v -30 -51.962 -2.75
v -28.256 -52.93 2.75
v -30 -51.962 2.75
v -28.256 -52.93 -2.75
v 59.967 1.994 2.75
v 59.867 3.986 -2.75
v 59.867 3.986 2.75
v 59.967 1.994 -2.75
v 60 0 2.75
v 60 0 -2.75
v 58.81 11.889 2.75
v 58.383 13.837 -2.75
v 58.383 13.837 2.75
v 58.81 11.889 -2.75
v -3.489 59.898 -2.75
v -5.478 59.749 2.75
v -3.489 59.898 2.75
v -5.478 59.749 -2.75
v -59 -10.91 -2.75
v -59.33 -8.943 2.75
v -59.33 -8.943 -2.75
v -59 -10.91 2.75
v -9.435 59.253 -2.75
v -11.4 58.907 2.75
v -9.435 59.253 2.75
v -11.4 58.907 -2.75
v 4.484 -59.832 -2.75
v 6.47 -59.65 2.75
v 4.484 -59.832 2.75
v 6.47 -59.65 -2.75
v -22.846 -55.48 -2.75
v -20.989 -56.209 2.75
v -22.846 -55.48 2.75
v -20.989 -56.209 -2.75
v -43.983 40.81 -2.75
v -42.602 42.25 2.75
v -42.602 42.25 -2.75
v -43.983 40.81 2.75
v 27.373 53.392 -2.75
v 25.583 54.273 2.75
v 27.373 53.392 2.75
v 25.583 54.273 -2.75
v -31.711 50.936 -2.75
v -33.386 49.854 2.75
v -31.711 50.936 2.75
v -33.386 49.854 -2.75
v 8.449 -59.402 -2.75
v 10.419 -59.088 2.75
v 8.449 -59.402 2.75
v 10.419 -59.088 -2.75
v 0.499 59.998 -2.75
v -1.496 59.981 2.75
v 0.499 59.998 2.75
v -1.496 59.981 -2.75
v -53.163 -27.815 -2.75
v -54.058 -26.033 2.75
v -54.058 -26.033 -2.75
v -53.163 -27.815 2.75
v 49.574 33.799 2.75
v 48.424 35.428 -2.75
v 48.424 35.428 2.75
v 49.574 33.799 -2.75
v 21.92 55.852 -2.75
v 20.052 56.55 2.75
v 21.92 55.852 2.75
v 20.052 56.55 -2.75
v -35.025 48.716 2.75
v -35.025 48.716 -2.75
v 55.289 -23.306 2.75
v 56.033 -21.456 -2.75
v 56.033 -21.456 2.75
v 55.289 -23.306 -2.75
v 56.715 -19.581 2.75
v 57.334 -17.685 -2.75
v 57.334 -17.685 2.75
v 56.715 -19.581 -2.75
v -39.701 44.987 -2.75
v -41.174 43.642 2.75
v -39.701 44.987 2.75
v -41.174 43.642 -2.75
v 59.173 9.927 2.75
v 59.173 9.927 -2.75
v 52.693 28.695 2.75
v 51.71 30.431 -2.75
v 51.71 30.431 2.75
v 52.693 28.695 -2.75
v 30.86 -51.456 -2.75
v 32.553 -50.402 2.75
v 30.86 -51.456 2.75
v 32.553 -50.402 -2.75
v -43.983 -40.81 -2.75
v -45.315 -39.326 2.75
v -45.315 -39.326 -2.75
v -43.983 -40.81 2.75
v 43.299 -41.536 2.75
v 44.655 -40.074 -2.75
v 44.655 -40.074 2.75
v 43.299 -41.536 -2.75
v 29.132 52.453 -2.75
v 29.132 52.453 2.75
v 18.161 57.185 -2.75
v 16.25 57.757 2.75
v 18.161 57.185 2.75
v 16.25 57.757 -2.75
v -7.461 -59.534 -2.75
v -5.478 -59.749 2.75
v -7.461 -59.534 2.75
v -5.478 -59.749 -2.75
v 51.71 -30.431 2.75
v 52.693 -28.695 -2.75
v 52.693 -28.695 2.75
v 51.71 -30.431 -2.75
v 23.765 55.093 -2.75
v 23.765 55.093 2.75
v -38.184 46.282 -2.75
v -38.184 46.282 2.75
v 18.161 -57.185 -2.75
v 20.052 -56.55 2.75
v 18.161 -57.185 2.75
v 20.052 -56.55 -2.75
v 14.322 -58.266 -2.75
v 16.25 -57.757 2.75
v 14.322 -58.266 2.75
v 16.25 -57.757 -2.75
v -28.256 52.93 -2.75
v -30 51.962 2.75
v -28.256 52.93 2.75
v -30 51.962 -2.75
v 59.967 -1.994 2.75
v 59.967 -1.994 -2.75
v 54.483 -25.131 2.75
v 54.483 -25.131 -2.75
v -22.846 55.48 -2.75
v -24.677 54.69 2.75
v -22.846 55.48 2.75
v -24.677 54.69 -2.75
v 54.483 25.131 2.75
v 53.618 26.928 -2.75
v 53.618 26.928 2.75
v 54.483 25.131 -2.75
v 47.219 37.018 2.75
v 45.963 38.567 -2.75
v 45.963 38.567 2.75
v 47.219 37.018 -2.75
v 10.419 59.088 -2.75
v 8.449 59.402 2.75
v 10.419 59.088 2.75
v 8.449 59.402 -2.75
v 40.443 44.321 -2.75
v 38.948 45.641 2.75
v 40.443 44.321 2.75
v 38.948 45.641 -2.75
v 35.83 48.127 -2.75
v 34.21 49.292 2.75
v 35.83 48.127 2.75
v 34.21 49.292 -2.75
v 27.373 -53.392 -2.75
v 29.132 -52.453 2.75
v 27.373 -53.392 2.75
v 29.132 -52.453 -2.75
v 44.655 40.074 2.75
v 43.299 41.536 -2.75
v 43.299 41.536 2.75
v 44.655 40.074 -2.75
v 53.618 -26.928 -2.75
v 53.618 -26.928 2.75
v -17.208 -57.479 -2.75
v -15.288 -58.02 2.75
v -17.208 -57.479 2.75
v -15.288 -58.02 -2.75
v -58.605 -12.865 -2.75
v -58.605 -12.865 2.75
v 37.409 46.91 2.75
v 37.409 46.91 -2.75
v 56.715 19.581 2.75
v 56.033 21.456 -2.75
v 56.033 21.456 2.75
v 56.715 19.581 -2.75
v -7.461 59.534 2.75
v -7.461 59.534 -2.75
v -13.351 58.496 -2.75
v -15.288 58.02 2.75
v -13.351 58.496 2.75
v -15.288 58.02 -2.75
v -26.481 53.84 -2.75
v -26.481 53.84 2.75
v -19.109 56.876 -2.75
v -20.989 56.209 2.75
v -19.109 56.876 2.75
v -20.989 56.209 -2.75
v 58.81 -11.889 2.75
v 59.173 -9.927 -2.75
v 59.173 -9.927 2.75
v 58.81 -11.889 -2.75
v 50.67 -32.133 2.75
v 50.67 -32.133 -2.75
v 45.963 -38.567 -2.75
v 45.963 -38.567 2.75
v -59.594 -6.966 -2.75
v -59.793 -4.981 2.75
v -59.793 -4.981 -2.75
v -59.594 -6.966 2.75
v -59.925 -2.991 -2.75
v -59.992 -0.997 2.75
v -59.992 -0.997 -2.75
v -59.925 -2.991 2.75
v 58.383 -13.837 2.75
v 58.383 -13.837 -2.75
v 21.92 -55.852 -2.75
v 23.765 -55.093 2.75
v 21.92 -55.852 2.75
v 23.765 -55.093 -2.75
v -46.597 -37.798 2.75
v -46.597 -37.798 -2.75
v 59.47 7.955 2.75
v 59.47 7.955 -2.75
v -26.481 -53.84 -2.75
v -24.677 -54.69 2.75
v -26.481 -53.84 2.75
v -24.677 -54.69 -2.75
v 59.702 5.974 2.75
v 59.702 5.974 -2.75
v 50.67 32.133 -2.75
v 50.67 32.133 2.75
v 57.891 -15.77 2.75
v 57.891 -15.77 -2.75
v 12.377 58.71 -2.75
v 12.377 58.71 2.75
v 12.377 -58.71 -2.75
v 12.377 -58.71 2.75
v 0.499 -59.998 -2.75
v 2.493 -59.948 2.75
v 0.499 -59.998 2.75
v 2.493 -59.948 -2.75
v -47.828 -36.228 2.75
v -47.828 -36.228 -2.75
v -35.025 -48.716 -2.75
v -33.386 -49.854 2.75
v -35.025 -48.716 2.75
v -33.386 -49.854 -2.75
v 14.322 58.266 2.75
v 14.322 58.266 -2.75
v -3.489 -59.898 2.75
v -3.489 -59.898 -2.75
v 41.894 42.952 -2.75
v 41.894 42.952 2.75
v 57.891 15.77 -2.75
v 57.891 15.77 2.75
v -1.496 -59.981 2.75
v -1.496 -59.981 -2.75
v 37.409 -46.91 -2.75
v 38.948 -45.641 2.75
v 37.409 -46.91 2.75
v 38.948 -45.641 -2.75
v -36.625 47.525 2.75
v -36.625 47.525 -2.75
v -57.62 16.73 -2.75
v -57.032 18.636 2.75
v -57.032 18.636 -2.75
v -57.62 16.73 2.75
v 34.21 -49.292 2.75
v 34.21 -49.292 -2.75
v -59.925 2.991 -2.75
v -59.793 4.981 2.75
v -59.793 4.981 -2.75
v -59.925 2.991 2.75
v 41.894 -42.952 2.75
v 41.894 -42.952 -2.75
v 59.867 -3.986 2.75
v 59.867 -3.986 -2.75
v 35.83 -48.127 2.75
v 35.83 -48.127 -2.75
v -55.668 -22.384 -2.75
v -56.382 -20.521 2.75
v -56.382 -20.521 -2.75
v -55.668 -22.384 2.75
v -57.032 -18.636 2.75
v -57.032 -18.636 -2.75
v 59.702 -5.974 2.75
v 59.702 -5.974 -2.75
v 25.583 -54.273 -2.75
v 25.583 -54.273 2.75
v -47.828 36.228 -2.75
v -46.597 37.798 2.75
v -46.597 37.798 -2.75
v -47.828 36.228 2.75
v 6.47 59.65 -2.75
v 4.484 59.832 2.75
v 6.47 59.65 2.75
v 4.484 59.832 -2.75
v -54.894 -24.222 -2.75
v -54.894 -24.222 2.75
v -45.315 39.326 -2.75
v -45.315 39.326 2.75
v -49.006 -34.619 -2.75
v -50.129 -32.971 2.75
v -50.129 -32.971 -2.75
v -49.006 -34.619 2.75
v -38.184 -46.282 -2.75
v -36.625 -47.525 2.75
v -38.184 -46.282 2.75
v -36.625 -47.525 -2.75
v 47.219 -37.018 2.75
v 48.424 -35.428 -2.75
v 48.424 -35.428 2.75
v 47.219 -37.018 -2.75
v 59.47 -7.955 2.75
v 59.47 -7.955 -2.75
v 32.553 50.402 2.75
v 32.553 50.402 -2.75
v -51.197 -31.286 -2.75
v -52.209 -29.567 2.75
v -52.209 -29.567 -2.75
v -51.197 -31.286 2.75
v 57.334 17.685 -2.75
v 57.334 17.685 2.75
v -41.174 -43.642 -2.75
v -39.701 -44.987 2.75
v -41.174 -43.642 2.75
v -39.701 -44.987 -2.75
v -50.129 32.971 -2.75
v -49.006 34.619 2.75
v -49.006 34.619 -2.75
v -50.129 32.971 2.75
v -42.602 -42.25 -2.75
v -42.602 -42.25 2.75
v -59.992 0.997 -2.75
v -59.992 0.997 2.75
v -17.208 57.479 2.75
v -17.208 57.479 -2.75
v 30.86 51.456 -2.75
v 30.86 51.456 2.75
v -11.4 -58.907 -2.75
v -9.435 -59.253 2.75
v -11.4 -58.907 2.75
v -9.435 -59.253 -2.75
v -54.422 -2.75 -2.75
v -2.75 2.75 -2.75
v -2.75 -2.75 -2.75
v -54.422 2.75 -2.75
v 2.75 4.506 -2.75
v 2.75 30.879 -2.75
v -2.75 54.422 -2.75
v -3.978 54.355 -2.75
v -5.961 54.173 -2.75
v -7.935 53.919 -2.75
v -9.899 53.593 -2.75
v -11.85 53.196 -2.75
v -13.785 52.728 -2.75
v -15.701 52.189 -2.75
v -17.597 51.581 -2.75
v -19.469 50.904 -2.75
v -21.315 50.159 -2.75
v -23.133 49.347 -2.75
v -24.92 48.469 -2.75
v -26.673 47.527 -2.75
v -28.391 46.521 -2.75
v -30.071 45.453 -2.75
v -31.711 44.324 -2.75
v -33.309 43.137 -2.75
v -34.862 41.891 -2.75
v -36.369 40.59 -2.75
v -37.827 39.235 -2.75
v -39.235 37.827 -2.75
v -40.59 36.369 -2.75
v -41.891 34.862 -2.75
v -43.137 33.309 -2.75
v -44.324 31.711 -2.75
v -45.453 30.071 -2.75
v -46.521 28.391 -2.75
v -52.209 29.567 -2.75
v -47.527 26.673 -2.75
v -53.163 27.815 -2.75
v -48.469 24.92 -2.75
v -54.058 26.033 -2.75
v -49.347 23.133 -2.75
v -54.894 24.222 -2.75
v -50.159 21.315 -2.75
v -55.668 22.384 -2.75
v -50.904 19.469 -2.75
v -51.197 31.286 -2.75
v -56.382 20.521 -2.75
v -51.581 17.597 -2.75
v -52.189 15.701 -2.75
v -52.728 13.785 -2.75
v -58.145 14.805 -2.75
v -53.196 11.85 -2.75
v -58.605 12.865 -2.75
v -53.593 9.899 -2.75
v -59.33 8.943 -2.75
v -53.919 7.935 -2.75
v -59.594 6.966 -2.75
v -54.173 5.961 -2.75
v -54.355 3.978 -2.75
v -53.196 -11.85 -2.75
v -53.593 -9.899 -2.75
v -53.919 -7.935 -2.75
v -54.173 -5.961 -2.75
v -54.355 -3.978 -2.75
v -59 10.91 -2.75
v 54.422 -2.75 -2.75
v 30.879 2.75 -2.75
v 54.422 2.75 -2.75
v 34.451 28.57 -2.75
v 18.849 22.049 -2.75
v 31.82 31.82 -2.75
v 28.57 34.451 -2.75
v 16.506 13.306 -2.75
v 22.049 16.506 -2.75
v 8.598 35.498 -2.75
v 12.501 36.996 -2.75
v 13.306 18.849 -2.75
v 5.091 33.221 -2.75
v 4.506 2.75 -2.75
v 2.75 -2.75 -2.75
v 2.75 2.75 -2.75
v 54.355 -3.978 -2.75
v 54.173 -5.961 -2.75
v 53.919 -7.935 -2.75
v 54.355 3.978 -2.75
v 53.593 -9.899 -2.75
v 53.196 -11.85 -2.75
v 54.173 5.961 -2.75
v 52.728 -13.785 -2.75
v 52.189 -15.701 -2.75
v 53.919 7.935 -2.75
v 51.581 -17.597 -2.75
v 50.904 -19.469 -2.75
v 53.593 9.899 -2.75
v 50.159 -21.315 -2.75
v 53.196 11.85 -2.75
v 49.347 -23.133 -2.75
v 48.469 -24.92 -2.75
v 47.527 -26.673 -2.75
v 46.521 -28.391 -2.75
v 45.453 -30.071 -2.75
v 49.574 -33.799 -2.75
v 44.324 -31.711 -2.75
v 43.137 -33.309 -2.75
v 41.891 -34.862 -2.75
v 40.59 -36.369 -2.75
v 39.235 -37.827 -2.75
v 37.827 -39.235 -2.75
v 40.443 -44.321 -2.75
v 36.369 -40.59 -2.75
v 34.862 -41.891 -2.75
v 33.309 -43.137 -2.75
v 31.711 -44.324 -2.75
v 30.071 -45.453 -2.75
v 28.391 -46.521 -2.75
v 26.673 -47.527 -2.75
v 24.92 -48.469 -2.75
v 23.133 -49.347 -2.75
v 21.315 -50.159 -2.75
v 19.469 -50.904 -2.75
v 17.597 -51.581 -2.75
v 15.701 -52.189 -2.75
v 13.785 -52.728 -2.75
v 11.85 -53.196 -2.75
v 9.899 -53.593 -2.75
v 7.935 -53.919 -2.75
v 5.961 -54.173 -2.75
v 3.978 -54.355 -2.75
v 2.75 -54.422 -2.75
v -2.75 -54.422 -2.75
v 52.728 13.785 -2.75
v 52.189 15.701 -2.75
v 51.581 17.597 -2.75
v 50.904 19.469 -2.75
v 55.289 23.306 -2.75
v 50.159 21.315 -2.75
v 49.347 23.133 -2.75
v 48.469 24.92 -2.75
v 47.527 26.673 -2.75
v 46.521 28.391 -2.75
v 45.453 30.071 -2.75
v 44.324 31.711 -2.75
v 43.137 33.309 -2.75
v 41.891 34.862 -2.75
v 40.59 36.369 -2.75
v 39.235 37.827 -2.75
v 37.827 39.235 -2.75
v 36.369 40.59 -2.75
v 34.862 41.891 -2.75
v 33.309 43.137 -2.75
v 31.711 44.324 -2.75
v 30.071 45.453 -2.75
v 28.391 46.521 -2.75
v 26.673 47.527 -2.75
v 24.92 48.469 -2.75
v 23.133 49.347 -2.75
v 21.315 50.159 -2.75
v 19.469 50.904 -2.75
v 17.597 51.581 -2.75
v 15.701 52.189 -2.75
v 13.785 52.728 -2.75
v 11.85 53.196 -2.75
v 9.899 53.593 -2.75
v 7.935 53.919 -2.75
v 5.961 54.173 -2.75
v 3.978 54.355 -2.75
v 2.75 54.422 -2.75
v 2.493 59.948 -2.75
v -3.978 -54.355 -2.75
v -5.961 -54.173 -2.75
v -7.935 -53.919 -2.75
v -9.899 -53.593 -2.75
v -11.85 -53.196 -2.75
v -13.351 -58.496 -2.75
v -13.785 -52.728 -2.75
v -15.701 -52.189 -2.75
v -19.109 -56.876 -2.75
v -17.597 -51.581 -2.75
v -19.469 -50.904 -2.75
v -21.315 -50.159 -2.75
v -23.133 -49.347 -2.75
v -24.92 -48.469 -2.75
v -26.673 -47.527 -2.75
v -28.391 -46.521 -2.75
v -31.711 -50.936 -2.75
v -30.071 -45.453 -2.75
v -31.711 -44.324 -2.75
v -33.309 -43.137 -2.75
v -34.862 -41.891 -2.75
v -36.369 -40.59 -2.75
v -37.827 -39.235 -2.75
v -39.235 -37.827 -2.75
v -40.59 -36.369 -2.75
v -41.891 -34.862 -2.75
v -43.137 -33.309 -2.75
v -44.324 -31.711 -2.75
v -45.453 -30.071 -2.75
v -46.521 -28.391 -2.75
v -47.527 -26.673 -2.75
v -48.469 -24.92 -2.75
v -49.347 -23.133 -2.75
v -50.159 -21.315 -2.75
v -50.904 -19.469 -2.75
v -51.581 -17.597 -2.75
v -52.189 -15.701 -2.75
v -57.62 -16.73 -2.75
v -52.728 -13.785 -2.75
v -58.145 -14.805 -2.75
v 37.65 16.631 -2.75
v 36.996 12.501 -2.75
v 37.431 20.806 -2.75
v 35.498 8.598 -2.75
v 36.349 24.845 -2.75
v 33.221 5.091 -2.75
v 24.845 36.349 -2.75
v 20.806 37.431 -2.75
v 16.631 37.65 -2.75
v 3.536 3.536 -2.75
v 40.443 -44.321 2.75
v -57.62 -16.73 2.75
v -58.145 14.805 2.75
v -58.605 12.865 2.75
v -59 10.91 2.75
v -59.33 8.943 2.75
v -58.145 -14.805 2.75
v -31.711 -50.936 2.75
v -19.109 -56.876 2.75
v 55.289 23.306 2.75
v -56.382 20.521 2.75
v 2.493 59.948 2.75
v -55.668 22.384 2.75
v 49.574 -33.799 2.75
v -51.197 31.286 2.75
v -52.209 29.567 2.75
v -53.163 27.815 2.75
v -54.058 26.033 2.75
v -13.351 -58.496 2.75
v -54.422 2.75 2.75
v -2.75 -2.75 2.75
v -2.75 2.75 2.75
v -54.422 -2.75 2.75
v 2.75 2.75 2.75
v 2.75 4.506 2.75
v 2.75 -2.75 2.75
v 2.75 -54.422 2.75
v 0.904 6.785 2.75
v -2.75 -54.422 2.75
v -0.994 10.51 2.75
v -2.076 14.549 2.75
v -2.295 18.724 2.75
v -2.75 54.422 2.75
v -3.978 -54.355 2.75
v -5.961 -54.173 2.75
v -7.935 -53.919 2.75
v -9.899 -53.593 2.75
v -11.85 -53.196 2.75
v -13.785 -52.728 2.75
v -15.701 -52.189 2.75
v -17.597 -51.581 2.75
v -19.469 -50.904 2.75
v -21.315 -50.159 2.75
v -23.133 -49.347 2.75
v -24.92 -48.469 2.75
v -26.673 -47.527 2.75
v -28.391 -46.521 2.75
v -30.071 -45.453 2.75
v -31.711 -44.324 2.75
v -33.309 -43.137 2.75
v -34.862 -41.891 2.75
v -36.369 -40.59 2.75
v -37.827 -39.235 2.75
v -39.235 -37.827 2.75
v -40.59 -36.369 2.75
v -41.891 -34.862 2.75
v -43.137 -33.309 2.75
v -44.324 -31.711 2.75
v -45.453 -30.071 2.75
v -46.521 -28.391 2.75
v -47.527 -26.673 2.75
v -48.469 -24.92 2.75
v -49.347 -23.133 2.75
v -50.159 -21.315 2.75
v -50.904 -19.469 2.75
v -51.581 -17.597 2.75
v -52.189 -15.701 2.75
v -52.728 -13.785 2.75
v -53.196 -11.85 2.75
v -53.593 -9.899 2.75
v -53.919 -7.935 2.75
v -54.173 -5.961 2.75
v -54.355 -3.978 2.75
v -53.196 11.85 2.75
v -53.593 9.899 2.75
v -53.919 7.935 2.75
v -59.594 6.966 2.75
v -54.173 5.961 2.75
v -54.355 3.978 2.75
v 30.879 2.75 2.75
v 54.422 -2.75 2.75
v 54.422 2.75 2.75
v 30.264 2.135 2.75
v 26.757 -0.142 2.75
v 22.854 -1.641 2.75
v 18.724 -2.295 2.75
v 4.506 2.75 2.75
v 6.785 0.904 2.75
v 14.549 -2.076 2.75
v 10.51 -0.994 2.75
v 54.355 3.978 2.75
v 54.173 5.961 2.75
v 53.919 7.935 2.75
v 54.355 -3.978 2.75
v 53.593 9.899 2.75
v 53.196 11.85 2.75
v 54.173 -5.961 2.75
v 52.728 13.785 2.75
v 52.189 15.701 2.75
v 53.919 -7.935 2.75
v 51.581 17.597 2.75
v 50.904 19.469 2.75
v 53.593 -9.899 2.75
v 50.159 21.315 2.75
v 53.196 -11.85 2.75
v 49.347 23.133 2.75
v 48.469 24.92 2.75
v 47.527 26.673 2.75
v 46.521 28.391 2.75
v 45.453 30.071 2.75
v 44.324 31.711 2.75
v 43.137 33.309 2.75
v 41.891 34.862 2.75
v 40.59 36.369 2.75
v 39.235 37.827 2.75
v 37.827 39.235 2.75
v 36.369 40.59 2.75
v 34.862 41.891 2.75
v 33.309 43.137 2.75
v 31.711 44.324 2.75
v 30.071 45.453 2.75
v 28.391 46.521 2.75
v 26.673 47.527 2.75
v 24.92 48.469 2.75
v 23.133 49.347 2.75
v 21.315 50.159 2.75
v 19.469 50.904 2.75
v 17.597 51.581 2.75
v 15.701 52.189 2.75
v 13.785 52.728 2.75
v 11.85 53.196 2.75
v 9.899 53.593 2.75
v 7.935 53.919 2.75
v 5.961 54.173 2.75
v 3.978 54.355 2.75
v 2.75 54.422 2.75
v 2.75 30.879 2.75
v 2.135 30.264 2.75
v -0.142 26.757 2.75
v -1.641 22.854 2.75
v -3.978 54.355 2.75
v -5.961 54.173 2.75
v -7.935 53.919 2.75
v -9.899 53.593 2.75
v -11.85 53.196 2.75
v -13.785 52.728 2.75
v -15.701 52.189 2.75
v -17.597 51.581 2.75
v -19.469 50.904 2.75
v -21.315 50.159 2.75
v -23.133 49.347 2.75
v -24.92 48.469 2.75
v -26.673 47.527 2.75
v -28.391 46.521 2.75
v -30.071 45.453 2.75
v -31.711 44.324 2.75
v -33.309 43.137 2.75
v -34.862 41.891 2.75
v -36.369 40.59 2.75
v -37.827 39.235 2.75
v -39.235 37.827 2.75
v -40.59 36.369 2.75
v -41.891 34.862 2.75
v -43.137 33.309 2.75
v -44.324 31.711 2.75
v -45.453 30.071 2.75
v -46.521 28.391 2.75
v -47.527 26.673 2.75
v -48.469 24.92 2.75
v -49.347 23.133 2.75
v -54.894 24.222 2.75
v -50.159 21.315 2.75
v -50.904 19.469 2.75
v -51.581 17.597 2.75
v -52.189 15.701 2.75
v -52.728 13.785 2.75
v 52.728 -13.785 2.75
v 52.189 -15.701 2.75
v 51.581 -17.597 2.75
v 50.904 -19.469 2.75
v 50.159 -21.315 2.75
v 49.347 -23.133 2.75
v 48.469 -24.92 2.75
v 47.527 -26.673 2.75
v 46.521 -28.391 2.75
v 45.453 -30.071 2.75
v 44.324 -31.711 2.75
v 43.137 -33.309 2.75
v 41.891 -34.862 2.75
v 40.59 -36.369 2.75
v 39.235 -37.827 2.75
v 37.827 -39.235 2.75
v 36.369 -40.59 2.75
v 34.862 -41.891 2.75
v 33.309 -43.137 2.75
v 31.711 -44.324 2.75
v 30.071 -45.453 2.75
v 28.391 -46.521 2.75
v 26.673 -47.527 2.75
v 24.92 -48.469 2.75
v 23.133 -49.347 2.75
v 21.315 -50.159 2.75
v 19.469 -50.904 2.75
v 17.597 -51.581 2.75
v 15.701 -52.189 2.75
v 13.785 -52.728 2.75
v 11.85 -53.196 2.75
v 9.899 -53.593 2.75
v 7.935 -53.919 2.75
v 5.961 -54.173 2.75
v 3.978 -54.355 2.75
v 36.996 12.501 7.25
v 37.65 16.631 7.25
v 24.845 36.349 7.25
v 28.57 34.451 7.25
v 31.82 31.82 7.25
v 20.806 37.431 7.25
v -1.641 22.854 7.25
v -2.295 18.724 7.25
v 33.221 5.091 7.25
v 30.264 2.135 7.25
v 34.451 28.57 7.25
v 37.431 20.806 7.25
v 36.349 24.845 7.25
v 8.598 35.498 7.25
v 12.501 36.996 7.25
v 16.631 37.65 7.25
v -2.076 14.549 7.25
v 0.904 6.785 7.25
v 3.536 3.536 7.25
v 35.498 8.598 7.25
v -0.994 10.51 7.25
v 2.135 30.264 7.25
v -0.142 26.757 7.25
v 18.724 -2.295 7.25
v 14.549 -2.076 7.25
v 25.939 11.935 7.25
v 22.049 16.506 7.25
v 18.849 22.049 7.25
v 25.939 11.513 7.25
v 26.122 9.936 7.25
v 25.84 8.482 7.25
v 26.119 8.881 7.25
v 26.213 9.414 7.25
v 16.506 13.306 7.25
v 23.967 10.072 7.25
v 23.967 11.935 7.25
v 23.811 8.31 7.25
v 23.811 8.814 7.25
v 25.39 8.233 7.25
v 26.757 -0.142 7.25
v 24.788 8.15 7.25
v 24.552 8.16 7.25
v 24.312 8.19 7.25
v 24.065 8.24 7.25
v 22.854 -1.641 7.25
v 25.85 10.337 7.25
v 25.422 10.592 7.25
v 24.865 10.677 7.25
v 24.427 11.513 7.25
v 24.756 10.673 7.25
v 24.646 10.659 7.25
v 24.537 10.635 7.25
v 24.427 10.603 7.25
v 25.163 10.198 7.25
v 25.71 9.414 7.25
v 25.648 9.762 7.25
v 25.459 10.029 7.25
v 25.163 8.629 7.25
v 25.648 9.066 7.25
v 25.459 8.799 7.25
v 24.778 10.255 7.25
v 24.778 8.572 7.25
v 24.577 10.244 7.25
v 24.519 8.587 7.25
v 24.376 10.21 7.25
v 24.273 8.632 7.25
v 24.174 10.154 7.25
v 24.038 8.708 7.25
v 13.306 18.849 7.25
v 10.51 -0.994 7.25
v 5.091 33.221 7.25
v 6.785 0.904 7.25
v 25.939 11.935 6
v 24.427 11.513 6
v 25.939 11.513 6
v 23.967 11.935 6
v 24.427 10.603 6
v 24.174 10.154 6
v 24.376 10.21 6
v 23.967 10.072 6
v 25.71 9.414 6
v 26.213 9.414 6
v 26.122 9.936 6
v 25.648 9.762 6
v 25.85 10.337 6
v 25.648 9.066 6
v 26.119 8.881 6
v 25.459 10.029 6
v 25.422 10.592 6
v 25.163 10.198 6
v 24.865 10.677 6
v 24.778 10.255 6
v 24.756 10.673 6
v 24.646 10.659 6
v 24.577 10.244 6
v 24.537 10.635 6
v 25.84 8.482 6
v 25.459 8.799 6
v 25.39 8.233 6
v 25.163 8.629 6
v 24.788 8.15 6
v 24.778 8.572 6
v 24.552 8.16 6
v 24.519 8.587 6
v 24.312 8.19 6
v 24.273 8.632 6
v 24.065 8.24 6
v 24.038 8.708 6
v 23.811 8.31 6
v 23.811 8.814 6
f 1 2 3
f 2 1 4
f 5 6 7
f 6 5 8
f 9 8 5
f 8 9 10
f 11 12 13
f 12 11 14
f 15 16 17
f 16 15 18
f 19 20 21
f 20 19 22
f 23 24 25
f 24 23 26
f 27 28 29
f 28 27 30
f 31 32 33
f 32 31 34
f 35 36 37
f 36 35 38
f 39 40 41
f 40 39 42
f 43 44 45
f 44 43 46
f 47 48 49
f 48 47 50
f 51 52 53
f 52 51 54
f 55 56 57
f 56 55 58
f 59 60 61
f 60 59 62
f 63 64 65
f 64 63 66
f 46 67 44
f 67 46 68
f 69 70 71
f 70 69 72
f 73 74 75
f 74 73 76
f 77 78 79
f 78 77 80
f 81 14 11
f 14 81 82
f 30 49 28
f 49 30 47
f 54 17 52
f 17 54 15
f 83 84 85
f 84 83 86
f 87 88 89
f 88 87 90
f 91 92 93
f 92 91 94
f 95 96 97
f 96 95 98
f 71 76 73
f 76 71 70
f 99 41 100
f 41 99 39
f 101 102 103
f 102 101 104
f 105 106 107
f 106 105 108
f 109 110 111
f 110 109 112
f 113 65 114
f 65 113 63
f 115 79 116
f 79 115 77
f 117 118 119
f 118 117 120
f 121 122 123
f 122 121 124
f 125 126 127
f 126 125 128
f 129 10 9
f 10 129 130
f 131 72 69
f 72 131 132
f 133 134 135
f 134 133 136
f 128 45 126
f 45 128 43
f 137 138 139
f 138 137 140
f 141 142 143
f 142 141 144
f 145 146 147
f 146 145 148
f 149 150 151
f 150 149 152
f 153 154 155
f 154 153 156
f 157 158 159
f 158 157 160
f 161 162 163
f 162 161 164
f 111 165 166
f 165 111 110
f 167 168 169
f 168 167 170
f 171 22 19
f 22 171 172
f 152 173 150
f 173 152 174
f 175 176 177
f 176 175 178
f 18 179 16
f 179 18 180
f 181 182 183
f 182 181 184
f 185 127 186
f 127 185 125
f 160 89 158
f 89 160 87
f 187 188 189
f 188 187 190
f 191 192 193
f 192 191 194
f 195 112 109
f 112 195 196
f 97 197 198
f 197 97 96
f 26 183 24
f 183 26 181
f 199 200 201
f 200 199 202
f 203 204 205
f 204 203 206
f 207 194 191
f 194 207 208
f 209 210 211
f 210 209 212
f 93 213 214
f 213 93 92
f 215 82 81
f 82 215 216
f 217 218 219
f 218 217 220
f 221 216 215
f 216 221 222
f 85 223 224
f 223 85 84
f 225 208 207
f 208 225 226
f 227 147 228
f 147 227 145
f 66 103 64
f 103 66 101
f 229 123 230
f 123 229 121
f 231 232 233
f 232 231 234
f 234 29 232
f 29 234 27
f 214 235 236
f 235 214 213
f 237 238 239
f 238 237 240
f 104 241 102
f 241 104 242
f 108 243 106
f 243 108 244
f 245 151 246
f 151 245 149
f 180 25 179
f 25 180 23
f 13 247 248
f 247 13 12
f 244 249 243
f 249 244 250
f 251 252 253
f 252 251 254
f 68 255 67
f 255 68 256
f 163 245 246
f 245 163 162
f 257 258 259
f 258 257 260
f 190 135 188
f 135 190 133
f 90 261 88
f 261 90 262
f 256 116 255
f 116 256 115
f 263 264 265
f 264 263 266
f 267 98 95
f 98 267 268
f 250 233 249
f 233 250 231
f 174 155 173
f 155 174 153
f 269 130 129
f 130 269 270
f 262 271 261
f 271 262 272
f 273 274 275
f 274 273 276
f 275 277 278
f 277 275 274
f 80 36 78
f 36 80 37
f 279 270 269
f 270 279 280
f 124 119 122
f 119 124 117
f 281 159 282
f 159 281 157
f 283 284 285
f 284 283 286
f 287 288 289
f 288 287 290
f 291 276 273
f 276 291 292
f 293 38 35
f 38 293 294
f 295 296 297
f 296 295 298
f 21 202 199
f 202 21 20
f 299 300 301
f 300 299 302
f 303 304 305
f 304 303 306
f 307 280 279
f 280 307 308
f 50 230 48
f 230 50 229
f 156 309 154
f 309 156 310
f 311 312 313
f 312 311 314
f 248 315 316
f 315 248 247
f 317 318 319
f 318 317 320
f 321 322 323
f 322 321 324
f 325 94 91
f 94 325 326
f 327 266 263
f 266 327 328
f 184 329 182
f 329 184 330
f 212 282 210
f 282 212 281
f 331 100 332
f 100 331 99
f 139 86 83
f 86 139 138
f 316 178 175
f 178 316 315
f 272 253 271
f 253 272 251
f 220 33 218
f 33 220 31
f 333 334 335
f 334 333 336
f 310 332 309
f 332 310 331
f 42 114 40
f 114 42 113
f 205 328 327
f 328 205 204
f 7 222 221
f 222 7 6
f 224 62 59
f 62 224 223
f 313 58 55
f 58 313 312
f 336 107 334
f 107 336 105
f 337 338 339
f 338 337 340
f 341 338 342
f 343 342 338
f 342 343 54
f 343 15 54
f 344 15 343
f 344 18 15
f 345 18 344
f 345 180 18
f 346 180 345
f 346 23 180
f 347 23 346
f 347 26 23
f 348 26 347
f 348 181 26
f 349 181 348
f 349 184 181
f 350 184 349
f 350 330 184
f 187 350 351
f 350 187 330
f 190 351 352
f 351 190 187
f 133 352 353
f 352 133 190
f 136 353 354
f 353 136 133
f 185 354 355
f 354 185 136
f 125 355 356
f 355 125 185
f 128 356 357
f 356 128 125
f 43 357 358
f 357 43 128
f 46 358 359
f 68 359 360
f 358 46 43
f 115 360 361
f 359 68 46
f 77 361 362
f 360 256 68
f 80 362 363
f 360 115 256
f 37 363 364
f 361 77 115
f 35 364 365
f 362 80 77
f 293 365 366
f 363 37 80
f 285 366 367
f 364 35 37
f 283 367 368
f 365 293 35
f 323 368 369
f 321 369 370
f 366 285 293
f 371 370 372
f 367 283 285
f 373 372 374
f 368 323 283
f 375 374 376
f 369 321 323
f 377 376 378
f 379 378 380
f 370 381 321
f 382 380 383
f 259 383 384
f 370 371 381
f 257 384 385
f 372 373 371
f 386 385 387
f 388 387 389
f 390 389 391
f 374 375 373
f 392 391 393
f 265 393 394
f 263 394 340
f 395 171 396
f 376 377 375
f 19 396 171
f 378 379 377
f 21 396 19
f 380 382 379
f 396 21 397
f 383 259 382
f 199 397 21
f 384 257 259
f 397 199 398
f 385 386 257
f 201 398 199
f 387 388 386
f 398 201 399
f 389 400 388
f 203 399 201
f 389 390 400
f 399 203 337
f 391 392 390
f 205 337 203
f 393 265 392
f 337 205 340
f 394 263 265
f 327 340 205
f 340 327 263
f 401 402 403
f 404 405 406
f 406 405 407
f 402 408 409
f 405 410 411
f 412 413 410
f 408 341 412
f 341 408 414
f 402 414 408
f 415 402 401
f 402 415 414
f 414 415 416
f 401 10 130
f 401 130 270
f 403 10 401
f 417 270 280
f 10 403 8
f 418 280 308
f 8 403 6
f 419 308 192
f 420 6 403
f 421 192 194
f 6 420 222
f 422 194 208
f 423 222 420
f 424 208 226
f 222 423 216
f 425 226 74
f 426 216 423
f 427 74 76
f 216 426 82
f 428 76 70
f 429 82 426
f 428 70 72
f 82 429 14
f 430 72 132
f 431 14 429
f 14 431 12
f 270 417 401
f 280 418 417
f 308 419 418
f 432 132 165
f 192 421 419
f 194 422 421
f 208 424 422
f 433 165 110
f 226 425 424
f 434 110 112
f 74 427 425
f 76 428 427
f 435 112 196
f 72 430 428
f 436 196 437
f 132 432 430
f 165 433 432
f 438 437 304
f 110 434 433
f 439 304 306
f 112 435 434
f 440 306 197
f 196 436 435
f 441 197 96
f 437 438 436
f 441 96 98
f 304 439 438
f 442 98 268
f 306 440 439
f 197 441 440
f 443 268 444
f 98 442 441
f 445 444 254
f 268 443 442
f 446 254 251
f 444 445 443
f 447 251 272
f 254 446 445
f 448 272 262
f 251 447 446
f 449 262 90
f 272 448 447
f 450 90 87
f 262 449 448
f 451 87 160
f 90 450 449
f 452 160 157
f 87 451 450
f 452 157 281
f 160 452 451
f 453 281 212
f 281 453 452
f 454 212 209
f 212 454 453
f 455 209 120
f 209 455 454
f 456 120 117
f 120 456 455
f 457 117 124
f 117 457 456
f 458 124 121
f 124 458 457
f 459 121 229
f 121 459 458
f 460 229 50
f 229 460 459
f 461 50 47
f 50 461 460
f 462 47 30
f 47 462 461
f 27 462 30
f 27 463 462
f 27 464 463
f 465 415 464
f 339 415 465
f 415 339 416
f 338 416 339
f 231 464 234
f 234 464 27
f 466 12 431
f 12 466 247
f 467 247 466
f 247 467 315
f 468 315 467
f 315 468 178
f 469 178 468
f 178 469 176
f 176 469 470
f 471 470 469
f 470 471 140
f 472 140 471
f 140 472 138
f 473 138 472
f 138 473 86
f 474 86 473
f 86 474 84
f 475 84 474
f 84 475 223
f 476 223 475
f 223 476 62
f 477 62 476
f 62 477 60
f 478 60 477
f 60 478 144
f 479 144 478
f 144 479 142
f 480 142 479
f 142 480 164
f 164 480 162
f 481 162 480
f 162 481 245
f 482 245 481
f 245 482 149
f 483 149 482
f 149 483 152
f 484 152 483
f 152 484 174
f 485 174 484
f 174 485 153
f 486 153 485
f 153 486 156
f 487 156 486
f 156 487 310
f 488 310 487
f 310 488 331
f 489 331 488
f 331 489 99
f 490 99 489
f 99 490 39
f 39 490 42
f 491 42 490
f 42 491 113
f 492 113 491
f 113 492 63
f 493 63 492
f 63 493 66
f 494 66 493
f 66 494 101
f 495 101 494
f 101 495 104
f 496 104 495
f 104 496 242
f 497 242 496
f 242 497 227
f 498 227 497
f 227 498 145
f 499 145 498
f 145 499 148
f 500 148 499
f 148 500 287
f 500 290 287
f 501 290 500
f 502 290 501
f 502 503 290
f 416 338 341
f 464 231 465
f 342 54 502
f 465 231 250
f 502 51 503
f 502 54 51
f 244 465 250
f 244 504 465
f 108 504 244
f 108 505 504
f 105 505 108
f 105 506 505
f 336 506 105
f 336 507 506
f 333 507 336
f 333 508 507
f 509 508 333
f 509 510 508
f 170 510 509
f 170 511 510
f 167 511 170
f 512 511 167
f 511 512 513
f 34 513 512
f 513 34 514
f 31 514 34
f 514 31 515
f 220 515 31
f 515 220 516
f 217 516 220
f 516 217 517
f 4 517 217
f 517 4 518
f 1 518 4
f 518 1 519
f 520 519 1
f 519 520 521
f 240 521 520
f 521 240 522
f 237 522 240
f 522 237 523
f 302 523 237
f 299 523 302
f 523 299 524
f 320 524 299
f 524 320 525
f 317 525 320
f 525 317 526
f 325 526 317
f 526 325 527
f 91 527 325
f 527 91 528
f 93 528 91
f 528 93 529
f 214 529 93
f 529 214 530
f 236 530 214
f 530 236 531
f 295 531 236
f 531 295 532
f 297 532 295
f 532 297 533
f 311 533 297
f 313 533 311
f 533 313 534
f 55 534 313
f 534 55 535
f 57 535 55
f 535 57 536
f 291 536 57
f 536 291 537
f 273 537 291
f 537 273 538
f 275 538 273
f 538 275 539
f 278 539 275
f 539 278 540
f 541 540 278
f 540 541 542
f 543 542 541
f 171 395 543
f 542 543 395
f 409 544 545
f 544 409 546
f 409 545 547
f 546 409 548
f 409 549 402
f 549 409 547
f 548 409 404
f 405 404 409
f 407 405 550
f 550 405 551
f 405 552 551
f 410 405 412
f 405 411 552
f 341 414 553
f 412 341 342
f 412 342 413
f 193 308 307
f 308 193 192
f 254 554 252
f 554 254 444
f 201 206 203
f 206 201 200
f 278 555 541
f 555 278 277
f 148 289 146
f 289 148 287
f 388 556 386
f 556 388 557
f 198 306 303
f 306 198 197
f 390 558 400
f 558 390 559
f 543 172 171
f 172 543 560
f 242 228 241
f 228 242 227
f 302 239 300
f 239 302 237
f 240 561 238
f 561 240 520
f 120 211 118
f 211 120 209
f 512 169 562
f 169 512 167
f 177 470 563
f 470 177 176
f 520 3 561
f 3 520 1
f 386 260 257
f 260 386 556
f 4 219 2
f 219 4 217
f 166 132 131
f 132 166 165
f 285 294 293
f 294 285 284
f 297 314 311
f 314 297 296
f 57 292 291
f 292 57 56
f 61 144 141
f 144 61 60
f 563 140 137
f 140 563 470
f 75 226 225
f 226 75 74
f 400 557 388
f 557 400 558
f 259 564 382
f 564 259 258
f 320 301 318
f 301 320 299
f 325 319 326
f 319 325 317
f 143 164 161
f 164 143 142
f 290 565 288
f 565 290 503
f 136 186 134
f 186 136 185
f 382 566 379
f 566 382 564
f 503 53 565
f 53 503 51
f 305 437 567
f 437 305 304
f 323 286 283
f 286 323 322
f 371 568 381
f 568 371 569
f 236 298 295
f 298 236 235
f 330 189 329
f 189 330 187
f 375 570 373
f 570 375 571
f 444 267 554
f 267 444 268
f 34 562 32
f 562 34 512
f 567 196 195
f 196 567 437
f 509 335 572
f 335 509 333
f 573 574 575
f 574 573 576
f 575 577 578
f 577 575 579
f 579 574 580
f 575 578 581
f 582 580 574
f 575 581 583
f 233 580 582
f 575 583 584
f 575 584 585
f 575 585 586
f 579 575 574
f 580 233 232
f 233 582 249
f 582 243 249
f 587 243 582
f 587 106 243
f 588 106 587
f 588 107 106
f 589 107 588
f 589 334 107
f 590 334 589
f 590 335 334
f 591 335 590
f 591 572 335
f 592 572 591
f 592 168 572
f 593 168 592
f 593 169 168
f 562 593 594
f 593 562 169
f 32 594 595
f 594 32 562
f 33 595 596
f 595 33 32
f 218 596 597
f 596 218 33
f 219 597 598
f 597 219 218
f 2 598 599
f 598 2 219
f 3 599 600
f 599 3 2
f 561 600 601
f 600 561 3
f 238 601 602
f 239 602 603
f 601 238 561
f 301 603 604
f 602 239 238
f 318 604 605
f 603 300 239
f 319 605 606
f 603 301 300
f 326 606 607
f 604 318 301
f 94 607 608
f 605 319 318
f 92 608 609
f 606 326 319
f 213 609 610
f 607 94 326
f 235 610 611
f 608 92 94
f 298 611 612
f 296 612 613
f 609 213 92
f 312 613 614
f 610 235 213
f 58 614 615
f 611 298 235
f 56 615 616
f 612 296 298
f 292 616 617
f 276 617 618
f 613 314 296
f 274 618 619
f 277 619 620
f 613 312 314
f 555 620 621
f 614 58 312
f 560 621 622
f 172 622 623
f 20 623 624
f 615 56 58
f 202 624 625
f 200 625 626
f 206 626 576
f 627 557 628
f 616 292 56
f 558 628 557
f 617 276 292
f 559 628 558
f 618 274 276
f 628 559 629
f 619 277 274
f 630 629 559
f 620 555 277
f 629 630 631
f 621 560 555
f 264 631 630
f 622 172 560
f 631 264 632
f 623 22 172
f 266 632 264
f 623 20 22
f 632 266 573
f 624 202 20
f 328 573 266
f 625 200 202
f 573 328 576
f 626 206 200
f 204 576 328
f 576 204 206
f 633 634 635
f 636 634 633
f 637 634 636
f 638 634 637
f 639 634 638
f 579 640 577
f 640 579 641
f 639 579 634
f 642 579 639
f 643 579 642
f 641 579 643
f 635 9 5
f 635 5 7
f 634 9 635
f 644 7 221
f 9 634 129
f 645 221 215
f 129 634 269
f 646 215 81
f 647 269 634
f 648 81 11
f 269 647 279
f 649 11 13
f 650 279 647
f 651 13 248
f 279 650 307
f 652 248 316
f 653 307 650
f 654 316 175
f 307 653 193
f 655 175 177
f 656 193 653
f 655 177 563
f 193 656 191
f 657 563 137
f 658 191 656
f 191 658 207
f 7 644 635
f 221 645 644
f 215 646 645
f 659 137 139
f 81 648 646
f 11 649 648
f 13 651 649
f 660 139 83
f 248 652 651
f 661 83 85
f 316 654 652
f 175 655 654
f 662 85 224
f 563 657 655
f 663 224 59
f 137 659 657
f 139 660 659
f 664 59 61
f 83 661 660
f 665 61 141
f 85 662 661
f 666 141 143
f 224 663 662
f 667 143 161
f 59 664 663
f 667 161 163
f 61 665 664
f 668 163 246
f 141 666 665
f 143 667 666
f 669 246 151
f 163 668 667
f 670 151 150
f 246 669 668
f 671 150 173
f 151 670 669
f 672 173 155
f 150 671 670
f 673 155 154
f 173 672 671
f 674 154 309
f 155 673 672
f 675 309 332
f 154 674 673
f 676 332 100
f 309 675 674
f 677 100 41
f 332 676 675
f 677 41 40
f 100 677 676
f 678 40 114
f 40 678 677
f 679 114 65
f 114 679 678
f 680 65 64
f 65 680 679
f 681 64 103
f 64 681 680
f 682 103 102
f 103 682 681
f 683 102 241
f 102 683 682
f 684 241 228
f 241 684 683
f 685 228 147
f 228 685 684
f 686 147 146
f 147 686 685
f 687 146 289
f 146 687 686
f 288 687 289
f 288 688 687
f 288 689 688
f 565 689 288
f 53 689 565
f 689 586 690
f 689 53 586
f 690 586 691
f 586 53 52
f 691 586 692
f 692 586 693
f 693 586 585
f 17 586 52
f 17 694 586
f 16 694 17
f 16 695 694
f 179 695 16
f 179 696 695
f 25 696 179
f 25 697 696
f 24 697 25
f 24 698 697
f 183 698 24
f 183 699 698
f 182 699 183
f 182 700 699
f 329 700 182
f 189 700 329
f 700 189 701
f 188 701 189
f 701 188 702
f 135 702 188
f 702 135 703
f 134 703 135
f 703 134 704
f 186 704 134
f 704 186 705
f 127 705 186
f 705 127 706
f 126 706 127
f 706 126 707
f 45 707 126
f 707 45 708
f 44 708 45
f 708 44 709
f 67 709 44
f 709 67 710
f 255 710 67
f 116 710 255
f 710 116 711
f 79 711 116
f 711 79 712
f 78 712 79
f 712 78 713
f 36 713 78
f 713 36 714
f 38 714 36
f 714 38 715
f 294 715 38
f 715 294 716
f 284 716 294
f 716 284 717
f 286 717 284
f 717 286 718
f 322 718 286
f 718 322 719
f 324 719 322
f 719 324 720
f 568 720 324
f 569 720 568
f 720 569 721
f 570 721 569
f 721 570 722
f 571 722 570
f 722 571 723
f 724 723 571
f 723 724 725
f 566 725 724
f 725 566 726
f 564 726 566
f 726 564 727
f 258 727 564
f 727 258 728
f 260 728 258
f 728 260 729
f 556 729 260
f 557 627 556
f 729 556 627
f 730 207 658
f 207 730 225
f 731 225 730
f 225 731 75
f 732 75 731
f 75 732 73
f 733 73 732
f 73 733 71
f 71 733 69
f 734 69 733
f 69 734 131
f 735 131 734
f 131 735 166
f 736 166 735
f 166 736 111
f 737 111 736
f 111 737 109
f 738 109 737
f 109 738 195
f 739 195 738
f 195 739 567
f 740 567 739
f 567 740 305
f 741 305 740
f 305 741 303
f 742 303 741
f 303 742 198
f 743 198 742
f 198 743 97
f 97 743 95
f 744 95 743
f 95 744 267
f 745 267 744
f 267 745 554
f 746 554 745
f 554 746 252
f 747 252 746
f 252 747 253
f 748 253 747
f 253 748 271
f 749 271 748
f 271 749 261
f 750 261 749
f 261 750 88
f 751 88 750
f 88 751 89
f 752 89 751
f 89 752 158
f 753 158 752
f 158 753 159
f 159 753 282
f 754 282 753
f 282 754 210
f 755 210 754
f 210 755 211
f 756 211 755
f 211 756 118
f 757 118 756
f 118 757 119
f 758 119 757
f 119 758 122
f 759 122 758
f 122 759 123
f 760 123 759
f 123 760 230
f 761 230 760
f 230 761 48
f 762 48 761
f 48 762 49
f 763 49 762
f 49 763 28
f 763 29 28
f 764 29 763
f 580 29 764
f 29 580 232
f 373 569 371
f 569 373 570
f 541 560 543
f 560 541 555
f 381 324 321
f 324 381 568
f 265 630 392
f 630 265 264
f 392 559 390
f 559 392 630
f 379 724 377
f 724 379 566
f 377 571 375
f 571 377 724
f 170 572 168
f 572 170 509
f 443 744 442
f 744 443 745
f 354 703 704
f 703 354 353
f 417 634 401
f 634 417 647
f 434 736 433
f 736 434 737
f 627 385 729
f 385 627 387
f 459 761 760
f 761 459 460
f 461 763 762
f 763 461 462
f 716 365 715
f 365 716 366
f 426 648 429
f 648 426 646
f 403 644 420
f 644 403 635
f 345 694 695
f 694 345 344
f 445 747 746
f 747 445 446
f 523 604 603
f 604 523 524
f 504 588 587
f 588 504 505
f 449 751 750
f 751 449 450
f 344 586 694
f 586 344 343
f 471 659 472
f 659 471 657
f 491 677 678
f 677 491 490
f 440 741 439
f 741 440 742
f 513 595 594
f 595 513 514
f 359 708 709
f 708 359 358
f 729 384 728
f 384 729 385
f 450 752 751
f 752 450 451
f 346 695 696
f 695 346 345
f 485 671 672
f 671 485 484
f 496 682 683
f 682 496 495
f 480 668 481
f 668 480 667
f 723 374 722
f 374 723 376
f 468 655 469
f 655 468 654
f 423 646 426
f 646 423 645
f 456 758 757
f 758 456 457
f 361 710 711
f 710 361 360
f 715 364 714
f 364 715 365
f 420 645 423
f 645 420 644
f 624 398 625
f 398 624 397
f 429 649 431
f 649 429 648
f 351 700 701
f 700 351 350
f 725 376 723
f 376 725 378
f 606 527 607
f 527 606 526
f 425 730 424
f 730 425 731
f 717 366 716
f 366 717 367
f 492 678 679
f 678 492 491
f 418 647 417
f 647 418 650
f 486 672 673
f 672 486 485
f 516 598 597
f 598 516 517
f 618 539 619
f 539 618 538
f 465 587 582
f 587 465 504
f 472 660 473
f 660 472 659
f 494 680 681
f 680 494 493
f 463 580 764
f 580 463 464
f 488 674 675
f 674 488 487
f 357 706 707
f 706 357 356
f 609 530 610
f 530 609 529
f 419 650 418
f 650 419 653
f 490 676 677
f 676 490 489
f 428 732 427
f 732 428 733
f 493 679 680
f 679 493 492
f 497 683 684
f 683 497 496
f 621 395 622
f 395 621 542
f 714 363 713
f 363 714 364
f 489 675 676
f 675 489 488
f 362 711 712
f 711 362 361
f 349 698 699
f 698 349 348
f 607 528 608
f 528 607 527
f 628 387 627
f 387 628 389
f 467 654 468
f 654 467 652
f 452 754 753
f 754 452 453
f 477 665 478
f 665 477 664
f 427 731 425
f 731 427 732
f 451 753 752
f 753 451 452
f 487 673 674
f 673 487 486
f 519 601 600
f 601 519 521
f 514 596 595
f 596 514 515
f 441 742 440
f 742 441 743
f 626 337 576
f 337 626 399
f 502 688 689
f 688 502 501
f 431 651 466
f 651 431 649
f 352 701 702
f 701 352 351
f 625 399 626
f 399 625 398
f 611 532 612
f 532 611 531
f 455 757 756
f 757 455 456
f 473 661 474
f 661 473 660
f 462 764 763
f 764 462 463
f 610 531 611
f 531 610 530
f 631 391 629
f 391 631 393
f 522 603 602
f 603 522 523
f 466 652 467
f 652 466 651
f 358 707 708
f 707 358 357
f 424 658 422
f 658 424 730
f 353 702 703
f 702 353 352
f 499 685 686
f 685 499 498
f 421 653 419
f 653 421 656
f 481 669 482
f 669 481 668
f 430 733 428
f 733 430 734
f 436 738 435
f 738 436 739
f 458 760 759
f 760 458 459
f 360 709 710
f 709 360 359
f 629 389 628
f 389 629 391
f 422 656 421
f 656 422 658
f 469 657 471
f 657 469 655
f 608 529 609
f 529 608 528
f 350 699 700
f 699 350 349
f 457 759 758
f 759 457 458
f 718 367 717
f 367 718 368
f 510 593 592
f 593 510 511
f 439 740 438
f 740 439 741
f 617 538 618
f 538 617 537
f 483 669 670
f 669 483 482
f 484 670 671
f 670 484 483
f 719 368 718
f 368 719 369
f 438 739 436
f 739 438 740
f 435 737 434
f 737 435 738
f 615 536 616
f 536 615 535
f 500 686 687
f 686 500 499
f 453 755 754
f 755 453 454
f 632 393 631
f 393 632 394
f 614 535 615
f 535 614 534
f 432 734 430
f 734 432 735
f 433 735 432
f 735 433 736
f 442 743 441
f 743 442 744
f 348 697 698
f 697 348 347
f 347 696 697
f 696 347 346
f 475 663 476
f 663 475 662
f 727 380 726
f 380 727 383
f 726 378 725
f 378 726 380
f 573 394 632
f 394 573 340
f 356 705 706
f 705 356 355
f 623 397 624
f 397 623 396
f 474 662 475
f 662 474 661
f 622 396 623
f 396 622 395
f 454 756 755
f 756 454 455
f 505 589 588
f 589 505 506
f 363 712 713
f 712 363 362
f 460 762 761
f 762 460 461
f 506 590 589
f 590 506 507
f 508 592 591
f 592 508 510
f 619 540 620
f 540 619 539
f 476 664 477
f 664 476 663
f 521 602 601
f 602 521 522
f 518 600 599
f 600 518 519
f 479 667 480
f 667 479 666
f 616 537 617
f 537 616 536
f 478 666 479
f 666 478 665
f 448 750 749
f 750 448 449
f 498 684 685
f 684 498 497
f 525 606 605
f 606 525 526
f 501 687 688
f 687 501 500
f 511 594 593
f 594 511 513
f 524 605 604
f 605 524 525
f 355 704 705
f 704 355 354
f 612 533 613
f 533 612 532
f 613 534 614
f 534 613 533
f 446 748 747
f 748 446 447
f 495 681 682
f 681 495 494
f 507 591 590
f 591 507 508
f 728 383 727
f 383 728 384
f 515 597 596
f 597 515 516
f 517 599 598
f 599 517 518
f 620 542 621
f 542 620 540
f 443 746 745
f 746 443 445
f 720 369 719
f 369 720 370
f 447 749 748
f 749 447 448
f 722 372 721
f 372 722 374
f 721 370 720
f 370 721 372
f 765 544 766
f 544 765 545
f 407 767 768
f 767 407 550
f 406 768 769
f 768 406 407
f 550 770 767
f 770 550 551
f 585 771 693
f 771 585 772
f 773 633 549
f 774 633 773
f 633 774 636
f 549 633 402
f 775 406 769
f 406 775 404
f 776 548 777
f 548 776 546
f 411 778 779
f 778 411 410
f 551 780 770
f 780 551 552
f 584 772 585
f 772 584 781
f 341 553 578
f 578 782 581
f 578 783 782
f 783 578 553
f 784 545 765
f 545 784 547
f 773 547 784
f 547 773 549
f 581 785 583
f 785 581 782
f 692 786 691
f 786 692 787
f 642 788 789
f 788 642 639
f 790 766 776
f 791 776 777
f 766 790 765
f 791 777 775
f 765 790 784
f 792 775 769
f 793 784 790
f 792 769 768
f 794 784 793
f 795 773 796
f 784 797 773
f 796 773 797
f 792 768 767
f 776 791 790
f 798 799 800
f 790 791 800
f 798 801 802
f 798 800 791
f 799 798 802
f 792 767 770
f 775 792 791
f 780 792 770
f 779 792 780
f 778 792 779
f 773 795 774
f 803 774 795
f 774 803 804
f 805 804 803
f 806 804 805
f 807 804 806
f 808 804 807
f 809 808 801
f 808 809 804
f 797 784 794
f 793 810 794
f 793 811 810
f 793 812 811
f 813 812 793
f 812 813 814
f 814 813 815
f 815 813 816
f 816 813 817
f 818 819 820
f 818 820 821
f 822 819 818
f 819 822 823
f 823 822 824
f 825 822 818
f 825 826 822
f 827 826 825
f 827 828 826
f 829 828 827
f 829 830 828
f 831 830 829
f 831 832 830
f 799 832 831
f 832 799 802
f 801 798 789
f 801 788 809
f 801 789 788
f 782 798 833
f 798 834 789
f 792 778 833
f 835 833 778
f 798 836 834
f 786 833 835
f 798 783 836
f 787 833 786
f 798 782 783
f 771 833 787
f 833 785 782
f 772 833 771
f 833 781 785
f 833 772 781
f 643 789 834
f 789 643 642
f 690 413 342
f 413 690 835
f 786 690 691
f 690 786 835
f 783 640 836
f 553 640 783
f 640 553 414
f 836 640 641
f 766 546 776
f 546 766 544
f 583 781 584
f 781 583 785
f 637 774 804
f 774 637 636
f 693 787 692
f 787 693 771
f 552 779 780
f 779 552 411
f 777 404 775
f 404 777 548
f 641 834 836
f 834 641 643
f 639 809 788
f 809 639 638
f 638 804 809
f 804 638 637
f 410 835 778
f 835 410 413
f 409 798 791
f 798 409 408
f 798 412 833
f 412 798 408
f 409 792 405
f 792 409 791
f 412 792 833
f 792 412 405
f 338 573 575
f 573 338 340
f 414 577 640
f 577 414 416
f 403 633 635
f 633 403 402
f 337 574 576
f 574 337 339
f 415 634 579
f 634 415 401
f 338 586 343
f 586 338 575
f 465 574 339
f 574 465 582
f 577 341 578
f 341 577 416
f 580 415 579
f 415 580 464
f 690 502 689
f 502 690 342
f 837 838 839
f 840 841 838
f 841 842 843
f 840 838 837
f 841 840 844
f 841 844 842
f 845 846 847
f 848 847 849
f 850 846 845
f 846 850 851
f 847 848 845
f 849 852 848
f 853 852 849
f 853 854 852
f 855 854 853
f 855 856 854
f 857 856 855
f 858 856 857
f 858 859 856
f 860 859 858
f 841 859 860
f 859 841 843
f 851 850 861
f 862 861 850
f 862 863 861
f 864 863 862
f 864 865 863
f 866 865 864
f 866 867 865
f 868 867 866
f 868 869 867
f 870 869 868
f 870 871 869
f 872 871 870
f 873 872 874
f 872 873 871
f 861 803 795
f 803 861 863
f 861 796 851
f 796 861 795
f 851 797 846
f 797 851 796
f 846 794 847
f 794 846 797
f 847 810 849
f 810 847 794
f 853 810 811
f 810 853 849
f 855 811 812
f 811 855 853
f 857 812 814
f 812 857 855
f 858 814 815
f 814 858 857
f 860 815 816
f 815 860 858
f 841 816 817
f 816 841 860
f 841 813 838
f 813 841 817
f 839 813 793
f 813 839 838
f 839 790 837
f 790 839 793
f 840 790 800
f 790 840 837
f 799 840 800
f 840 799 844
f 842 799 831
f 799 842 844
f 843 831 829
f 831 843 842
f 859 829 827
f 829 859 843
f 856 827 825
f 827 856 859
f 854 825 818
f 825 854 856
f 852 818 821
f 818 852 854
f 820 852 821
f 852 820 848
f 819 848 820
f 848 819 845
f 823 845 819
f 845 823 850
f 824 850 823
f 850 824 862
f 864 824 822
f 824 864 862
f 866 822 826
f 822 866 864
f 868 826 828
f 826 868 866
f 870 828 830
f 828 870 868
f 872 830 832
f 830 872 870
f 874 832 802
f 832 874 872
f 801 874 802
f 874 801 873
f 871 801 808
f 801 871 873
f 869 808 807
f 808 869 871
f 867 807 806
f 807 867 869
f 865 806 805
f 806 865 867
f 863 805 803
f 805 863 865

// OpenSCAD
outerdiameter=120;
ringwidth=5.5;
height=5.5;
holerotation = 15;
//index=0;
//index=1;
//index=2;
//index=3;
//index=4;
index=5;

module axelpart()
{
    translate([25,0,2.25]) {
        difference(){
            cylinder(h=10, r=20, center=true);
            //union(){
            //cube([6.4,6.4,100],true);
            rotate(a=holerotation*index,v=[0,0,1]){
                cube([6.4,6.4,100],true);
            }
           // }
        }
    }
}

module ring() {
    $fa =0.1;
    color("Lime") 
    difference() {
        cylinder(h=height, r=outerdiameter/2, center=true);
        cylinder(r=(outerdiameter/2)-ringwidth,h=height+2,center=true) ;  
    }
}
difference(){
union(){
    ring();
    spoke();
    rotate(a=90, v=[0,0,1]) {spoke(); }
    rotate(a=45, v=[0,0,1]){
        axelpart();
    }
}

 translate([25,10,6]) {
color("Lime")
linear_extrude(height=2, convexity=4)
                text("5", 
                     size=5*22/30,
                     font="Bitstream Vera Sans",
                     halign="center",
                     valign="center");
 }

}

module spoke()
{
     cube([outerdiameter-5,height,height],true);
}
